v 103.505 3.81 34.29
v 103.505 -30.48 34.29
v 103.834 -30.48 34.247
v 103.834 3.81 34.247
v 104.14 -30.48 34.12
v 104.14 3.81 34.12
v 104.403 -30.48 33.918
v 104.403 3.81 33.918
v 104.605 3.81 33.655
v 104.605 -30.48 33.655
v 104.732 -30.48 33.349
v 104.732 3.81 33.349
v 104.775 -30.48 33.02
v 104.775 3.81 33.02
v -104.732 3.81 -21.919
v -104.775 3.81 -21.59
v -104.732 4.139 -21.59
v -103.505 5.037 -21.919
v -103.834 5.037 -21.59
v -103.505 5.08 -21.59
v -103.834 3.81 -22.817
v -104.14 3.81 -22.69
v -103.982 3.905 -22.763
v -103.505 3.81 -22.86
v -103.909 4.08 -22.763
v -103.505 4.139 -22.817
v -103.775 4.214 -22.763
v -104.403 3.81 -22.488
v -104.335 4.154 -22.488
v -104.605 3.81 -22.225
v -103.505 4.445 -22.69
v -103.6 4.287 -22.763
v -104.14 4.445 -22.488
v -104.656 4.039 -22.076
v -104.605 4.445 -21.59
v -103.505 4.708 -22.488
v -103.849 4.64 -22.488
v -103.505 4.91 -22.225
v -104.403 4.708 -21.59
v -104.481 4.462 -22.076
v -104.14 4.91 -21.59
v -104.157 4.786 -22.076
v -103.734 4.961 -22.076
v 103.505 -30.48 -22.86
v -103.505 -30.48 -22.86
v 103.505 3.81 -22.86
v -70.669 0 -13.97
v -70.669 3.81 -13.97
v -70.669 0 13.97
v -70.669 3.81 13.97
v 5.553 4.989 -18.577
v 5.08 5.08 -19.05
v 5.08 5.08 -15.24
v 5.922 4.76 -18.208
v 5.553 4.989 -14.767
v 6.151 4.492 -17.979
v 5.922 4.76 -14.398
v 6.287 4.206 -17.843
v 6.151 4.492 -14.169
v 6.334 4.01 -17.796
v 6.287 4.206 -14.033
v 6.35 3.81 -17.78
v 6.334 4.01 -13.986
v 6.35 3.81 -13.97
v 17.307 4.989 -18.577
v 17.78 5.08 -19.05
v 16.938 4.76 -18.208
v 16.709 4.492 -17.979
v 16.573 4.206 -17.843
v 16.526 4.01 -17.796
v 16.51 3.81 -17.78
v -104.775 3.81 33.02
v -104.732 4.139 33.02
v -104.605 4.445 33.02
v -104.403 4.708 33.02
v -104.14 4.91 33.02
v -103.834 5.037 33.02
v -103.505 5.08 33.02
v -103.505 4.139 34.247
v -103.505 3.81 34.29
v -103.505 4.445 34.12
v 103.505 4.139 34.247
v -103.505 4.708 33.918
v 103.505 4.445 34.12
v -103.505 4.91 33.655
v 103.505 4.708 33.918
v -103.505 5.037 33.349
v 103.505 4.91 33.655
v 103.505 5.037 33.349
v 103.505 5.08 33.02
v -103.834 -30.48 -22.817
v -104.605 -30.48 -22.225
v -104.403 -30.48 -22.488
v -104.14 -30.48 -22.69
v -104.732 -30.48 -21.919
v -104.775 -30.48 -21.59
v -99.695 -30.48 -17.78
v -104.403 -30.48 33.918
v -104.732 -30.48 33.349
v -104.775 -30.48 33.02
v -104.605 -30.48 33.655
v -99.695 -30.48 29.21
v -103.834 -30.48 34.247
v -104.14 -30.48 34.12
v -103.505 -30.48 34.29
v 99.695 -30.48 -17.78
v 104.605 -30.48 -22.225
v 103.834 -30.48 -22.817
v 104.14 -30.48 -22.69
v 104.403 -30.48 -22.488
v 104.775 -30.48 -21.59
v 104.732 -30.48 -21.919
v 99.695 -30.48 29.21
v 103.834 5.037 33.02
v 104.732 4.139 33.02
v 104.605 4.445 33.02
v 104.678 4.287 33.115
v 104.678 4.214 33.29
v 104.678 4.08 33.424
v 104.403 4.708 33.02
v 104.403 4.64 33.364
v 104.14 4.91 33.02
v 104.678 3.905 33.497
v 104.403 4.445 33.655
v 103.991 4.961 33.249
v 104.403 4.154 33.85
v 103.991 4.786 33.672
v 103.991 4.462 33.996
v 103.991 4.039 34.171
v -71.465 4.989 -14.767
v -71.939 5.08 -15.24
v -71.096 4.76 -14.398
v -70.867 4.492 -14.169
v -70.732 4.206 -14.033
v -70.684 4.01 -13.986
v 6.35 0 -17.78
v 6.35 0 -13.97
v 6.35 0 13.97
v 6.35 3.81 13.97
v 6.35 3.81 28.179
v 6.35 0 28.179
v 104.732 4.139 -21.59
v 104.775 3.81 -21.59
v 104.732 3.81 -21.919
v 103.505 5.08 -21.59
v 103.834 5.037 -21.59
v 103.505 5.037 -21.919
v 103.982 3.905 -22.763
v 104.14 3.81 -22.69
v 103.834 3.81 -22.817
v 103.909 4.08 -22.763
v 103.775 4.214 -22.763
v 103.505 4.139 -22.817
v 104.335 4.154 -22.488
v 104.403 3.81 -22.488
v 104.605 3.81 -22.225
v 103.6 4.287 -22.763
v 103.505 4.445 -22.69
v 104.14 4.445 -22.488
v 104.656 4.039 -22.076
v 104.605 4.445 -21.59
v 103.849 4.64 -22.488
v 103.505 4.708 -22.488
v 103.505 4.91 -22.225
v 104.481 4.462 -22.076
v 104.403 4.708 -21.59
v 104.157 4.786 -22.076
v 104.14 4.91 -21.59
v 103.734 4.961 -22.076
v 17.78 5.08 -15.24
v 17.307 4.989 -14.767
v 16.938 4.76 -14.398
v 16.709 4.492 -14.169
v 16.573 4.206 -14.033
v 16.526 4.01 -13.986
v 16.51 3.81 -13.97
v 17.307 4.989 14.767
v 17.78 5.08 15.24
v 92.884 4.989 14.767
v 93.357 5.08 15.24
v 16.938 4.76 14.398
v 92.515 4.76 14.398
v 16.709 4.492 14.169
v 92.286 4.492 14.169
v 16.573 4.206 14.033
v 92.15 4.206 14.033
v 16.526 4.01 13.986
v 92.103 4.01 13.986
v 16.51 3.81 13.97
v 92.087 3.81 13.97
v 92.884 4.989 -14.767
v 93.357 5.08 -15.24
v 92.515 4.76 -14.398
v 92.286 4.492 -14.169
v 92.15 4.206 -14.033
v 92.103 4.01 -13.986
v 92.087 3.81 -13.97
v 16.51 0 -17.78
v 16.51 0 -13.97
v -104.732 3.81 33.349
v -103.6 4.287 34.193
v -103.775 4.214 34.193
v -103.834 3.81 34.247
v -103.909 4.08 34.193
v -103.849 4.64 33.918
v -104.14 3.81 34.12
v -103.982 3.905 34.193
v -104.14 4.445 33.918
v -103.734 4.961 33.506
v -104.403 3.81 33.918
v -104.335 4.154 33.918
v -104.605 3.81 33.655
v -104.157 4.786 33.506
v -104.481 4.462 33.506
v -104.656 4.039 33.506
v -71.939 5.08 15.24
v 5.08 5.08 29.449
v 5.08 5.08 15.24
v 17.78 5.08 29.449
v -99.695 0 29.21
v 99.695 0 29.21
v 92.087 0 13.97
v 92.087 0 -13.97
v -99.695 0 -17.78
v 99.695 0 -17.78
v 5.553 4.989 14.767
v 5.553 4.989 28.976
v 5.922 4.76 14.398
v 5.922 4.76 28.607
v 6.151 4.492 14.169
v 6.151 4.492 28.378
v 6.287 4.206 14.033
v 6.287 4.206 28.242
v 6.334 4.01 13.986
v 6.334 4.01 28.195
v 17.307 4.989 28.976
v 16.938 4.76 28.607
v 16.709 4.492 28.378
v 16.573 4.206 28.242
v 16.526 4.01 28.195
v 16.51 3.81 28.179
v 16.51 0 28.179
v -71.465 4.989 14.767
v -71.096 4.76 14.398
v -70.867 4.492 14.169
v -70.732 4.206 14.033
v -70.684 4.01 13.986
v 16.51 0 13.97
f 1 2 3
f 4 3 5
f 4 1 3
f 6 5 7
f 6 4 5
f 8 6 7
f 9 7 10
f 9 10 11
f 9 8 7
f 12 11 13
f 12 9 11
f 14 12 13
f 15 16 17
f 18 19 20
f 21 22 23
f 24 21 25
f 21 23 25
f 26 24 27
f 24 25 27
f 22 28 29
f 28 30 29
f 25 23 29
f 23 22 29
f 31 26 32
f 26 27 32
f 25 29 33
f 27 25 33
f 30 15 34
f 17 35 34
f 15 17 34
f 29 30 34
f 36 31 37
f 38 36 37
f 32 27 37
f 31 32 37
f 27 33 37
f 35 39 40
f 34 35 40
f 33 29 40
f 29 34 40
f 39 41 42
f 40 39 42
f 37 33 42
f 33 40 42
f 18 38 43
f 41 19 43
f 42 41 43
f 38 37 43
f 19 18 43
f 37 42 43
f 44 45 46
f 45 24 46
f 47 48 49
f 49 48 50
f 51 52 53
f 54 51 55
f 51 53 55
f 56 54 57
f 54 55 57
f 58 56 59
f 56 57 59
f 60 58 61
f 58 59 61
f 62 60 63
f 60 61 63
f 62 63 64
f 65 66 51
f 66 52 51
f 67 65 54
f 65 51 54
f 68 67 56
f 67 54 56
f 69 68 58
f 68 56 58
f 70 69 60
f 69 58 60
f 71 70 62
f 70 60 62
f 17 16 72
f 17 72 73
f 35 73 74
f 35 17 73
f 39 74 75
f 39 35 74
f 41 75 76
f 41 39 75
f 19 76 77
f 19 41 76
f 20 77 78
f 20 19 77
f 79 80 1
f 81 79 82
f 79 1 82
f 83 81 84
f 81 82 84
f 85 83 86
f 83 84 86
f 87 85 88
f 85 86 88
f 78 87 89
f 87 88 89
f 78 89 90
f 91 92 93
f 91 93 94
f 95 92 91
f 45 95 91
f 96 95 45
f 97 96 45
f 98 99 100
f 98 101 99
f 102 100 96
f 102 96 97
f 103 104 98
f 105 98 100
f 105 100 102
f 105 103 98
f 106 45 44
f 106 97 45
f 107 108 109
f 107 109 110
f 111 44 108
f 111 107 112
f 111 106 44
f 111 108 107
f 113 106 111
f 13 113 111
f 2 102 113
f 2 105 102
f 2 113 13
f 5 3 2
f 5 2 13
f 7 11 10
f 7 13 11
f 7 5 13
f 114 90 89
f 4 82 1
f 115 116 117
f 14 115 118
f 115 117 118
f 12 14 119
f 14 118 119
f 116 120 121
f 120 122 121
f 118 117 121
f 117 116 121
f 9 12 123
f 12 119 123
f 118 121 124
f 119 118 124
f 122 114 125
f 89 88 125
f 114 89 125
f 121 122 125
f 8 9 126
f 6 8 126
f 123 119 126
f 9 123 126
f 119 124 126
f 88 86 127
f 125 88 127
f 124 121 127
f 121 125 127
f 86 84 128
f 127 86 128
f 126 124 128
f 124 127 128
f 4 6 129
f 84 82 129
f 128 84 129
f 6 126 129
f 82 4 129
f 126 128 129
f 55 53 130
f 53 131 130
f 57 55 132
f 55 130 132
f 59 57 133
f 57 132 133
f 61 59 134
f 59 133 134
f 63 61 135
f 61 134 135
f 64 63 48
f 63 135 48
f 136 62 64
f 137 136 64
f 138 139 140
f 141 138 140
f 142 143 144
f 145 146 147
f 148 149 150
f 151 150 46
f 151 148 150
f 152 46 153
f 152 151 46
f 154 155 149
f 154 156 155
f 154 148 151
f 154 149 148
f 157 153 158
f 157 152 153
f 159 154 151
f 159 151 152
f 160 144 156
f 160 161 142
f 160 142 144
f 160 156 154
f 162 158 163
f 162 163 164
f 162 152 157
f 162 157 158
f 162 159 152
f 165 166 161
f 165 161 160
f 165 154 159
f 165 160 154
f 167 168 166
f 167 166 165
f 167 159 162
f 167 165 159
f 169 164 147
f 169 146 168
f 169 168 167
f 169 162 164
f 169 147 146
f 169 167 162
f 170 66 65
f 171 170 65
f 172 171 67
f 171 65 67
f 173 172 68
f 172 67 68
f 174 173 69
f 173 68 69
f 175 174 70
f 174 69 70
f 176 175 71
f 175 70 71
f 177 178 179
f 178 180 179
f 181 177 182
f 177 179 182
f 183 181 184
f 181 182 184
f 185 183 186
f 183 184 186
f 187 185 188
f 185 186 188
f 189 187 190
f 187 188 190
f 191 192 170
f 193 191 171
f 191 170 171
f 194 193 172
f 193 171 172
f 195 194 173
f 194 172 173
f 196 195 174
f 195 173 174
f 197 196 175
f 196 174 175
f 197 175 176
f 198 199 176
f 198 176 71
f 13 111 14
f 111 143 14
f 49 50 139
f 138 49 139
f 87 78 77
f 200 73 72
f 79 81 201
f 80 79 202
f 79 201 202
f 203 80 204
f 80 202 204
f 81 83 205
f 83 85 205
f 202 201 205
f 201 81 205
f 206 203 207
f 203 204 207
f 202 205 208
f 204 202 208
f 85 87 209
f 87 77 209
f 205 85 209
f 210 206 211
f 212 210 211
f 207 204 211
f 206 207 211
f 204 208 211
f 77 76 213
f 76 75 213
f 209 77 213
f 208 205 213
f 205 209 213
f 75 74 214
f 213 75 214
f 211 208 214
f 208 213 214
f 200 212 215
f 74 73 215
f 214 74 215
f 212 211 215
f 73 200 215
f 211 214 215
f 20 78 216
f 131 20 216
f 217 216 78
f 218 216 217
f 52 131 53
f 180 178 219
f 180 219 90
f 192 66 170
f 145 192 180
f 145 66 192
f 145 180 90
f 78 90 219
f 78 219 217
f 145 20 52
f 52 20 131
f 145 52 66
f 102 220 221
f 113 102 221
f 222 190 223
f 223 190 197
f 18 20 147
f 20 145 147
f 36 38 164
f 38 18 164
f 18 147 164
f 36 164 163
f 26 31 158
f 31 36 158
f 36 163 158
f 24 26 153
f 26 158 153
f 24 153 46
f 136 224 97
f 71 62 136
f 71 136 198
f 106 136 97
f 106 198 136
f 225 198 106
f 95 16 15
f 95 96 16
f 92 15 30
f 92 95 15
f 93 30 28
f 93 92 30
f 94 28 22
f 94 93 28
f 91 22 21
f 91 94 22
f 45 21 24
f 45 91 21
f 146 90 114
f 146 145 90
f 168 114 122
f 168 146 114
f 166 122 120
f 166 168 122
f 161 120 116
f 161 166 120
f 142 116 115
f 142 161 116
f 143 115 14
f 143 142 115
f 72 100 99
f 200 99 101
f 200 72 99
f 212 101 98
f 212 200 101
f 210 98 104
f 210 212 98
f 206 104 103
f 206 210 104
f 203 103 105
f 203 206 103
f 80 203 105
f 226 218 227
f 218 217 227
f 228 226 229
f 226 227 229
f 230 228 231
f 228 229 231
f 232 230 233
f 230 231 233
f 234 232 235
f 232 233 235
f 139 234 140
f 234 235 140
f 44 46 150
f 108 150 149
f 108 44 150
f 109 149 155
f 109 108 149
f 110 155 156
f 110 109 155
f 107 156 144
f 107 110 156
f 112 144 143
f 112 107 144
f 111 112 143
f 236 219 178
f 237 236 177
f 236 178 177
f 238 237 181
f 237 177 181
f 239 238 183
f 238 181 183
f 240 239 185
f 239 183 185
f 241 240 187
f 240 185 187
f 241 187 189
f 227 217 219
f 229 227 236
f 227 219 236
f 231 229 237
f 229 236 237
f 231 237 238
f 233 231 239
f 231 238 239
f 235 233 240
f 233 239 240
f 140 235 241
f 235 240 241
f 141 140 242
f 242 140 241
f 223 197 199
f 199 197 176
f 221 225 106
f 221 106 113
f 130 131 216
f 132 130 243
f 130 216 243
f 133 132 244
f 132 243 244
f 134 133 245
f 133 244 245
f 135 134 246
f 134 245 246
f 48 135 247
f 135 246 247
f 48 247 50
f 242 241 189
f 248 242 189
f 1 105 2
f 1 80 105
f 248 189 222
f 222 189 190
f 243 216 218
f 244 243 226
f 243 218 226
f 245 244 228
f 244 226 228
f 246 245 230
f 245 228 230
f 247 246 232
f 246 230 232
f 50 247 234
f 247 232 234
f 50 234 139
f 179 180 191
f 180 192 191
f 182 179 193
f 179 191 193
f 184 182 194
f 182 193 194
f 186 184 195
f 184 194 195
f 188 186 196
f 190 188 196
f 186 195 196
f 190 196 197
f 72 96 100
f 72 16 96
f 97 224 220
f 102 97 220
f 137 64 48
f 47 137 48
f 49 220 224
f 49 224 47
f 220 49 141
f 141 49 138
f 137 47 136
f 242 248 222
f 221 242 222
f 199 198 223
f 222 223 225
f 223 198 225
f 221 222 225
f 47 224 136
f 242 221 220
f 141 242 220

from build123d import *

# Parameters (mm, degrees)
SKETCH1_W           = 209.55
SKETCH1_H           = 57.15
BOSS_EXTRUDE1_DEPTH = 5.08
SKETCH2_W           = 209.55
SKETCH2_H           = 57.15
SKETCH2_W_2         = 199.39
SKETCH2_H_2         = 46.99
BOSS_EXTRUDE2_DEPTH = 30.48
CUT_EXTRUDE2_REACH  = 117.837
FILLET1_R           = 1.27


with BuildPart() as part:
    # Sketch1 → Boss-Extrude1 (new body)
    with BuildSketch(Plane(origin=(0, 0, 0), x_dir=(1, 0, 0), z_dir=(0, 1, 0))):
        with Locations((0, -5.715)):
            Rectangle(SKETCH1_W, SKETCH1_H)
    extrude(amount=BOSS_EXTRUDE1_DEPTH)

    # Sketch2 → Boss-Extrude2 (add)
    with BuildSketch(Plane.XZ):
        with Locations((0, 5.715)):
            Rectangle(SKETCH2_W, SKETCH2_H)
        with Locations((0, 5.715)):
            Rectangle(SKETCH2_W_2, SKETCH2_H_2, mode=Mode.SUBTRACT)
    extrude(amount=BOSS_EXTRUDE2_DEPTH)

    # Sketch3 → Cut-Extrude2 (cut, up to next)
    with BuildSketch(Plane(origin=(0, 5.08, 0), x_dir=(1, 0, 0), z_dir=(0, 1, 0)), mode=Mode.PRIVATE) as cut_extrude2_sk1:
        Polygon((6.35, 13.97), (-70.668502474, 13.97), (-70.668502474, -13.97), (6.35, -13.97), (6.35, -28.17903858), (16.51, -28.17903858), (16.51, -13.97), (92.086948761, -13.97), (92.086948761, 13.97), (16.51, 13.97), (16.51, 17.78), (6.35, 17.78), align=None)
    cut_extrude2_tool1 = extrude(cut_extrude2_sk1.sketch, amount=-CUT_EXTRUDE2_REACH, mode=Mode.PRIVATE) & part.part
    add(cut_extrude2_tool1.solids().sort_by_distance((10.737118, 5.08, 0.513245))[0], mode=Mode.SUBTRACT)

    # Fillet1
    fillet1_edges = [part.edges().sort_by_distance(p)[0] for p in [
        (-104.775, 5.08, 5.715),
        (0, 5.08, 34.29),
        (92.086948761, 5.08, 0),
        (-70.668502474, 5.08, 0),
        (-32.159251237, 5.08, 13.97),
        (6.35, 5.08, 21.07451929),
        (11.43, 5.08, 28.17903858),
        (54.29847438, 5.08, 13.97),
        (104.775, 5.08, 5.715),
        (16.51, 5.08, -15.875),
        (-32.159251237, 5.08, -13.97),
        (54.29847438, 5.08, -13.97),
        (16.51, 5.08, 21.07451929),
        (11.43, 5.08, -17.78),
        (6.35, 5.08, -15.875),
        (104.775, -12.7, 34.29),
        (-104.775, -12.7, 34.29),
        (-104.775, -12.7, -22.86),
        (104.775, -12.7, -22.86),
        (0, 5.08, -22.86),
    ]]
    fillet(fillet1_edges, radius=FILLET1_R)


solid = part.part
